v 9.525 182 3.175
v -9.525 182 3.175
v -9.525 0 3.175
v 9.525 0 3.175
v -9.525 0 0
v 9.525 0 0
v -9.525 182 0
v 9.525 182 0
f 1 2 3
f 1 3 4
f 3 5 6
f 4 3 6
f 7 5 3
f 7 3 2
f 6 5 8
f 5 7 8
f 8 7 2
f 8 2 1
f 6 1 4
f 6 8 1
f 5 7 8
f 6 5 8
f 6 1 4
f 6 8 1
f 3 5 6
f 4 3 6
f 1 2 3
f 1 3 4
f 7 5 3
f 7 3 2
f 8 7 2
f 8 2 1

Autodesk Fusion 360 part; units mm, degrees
ref_plane "WorkPlane12" through (0, -1, 0) normal (0, 1, 0) x (0, 0, 1)
sketch "MyStock" plane through (0, 0, 0) normal (0, 0, 1) x (1, 0, 0)
  line L0 (-9.525, 182) -> (9.525, 182)
  line L1 (9.525, 182) -> (9.525, 0)
  line L2 (-9.525, 0) -> (-9.525, 182)
  line L3 (-9.525, 0) -> (9.525, 0)
  dimension "d2016" = 9.525
  dimension "d2017" = 9.525
  dimension "d2102" = 182
extrude "Extrude21" add sketch "MyStock" along normal blind 3.175 makes body 1
sketch "Box Big part" plane through (0, 0, 0) normal (0, 0, 1) x (1, 0, 0)
  line L0 (-224.905, 0) -> (-240, 0)
  line L1 (0, 16.095) -> (0, 0)
  line L2 (-240, 0) -> (-224.905, 0)
  line L3 (-224.905, 0) -> (-224.905, 1.5613)
  line L4 (-223.7758, 3.175) -> (-216.2242, 3.175)
  line L5 (-215.095, 1.5613) -> (-215.095, 0)
  line L6 (-240, 16.095) -> (-238.4387, 16.095)
  line L7 (-236.825, 17.2242) -> (-236.825, 24.7758)
  line L8 (-238.4387, 25.905) -> (-240, 25.905)
  line L9 (-215.095, 0) -> (-204.905, 0)
  line L10 (1.75, 0) -> (22.5, 0)
  arc A0 (-215.095, 1.5613) -> (-216.2242, 3.175) centre (-215.5171, 2.4679) ccw
  arc A1 (-223.7758, 3.175) -> (-224.905, 1.5613) centre (-224.4829, 2.4679) ccw
  line L11 (-240, 0) -> (-240, 16.095)
  line L12 (-240, 25.905) -> (-240, 36.095)
  arc A2 (-238.4387, 16.095) -> (-236.825, 17.2242) centre (-237.5321, 16.5171) ccw
  arc A3 (-236.825, 24.7758) -> (-238.4387, 25.905) centre (-237.5321, 25.4829) ccw
  line L13 (-302, 91) -> (0, 91) construction
  line L14 (-120, -20) -> (-120, 200) construction
  arc A4 (-1.5613, 25.905) -> (-3.175, 24.7758) centre (-2.4679, 25.4829) ccw
  arc A5 (-3.175, 17.2242) -> (-1.5613, 16.095) centre (-2.4679, 16.5171) ccw
  line L15 (-3.175, 17.2242) -> (-3.175, 24.7758)
  line L16 (-1.5613, 25.905) -> (0, 25.905)
  line L17 (0, 25.905) -> (0, 36.095)
  line L18 (0, 16.095) -> (-1.5613, 16.095)
  line L19 (0, 16.095) -> (0, 0)
  line L20 (-215.095, 180.4387) -> (-215.095, 182)
  line L21 (-224.905, 182) -> (-224.905, 180.4387)
  line L22 (-215.095, 182) -> (-204.905, 182)
  arc A6 (-216.2242, 178.825) -> (-215.095, 180.4387) centre (-215.5171, 179.5321) ccw
  line L23 (-224.905, 182) -> (-240, 182)
  arc A7 (-224.905, 180.4387) -> (-223.7758, 178.825) centre (-224.4829, 179.5321) ccw
  line L24 (-223.7758, 178.825) -> (-216.2242, 178.825)
  line L25 (-240, 182) -> (-224.905, 182)
  arc A8 (-195.095, 1.5613) -> (-196.2242, 3.175) centre (-195.5171, 2.4679) ccw
  line L26 (-195.095, 1.5613) -> (-195.095, 0)
  arc A9 (-203.7758, 3.175) -> (-204.905, 1.5613) centre (-204.4829, 2.4679) ccw
  line L27 (-195.095, 0) -> (-184.905, 0)
  line L28 (-203.7758, 3.175) -> (-196.2242, 3.175)
  line L29 (-204.905, 0) -> (-204.905, 1.5613)
  arc A10 (-175.095, 1.5613) -> (-176.2242, 3.175) centre (-175.5171, 2.4679) ccw
  line L30 (-175.095, 1.5613) -> (-175.095, 0)
  arc A11 (-183.7758, 3.175) -> (-184.905, 1.5613) centre (-184.4829, 2.4679) ccw
  line L31 (-175.095, 0) -> (-164.905, 0)
  line L32 (-183.7758, 3.175) -> (-176.2242, 3.175)
  line L33 (-184.905, 0) -> (-184.905, 1.5613)
  arc A12 (-155.095, 1.5613) -> (-156.2242, 3.175) centre (-155.5171, 2.4679) ccw
  line L34 (-155.095, 1.5613) -> (-155.095, 0)
  arc A13 (-163.7758, 3.175) -> (-164.905, 1.5613) centre (-164.4829, 2.4679) ccw
  line L35 (-155.095, 0) -> (-144.905, 0)
  line L36 (-163.7758, 3.175) -> (-156.2242, 3.175)
  line L37 (-164.905, 0) -> (-164.905, 1.5613)
  arc A14 (-135.095, 1.5613) -> (-136.2242, 3.175) centre (-135.5171, 2.4679) ccw
  line L38 (-135.095, 1.5613) -> (-135.095, 0)
  arc A15 (-143.7758, 3.175) -> (-144.905, 1.5613) centre (-144.4829, 2.4679) ccw
  line L39 (-135.095, 0) -> (-124.905, 0)
  line L40 (-143.7758, 3.175) -> (-136.2242, 3.175)
  line L41 (-144.905, 0) -> (-144.905, 1.5613)
  arc A16 (-115.095, 1.5613) -> (-116.2242, 3.175) centre (-115.5171, 2.4679) ccw
  line L42 (-115.095, 1.5613) -> (-115.095, 0)
  arc A17 (-123.7758, 3.175) -> (-124.905, 1.5613) centre (-124.4829, 2.4679) ccw
  line L43 (-115.095, 0) -> (-104.905, 0)
  line L44 (-123.7758, 3.175) -> (-116.2242, 3.175)
  line L45 (-124.905, 0) -> (-124.905, 1.5613)
  arc A18 (-95.095, 1.5613) -> (-96.2242, 3.175) centre (-95.5171, 2.4679) ccw
  line L46 (-95.095, 1.5613) -> (-95.095, 0)
  arc A19 (-103.7758, 3.175) -> (-104.905, 1.5613) centre (-104.4829, 2.4679) ccw
  line L47 (-95.095, 0) -> (-84.905, 0)
  line L48 (-103.7758, 3.175) -> (-96.2242, 3.175)
  line L49 (-104.905, 0) -> (-104.905, 1.5613)
  line L50 (0, 0) -> (-4.905, 0)
  line L51 (-238.4387, 45.905) -> (-240, 45.905)
  line L52 (-240, 36.095) -> (-238.4387, 36.095)
  arc A20 (-238.4387, 36.095) -> (-236.825, 37.2242) centre (-237.5321, 36.5171) ccw
  line L53 (-240, 45.905) -> (-240, 56.095)
  arc A21 (-236.825, 44.7758) -> (-238.4387, 45.905) centre (-237.5321, 45.4829) ccw
  line L54 (-236.825, 37.2242) -> (-236.825, 44.7758)
  line L55 (-238.4387, 65.905) -> (-240, 65.905)
  line L56 (-240, 56.095) -> (-238.4387, 56.095)
  arc A22 (-238.4387, 56.095) -> (-236.825, 57.2242) centre (-237.5321, 56.5171) ccw
  line L57 (-240, 65.905) -> (-240, 76.095)
  arc A23 (-236.825, 64.7758) -> (-238.4387, 65.905) centre (-237.5321, 65.4829) ccw
  line L58 (-236.825, 57.2242) -> (-236.825, 64.7758)
  line L59 (-238.4387, 85.905) -> (-240, 85.905)
  line L60 (-240, 76.095) -> (-238.4387, 76.095)
  arc A24 (-238.4387, 76.095) -> (-236.825, 77.2242) centre (-237.5321, 76.5171) ccw
  line L61 (-240, 85.905) -> (-240, 96.095)
  arc A25 (-236.825, 84.7758) -> (-238.4387, 85.905) centre (-237.5321, 85.4829) ccw
  line L62 (-236.825, 77.2242) -> (-236.825, 84.7758)
  line L63 (-238.4387, 105.905) -> (-240, 105.905)
  line L64 (-240, 96.095) -> (-238.4387, 96.095)
  arc A26 (-238.4387, 96.095) -> (-236.825, 97.2242) centre (-237.5321, 96.5171) ccw
  line L65 (-240, 105.905) -> (-240, 116.095)
  arc A27 (-236.825, 104.7758) -> (-238.4387, 105.905) centre (-237.5321, 105.4829) ccw
  line L66 (-236.825, 97.2242) -> (-236.825, 104.7758)
  arc A28 (-196.2242, 178.825) -> (-195.095, 180.4387) centre (-195.5171, 179.5321) ccw
  line L67 (-195.095, 180.4387) -> (-195.095, 182)
  arc A29 (-204.905, 180.4387) -> (-203.7758, 178.825) centre (-204.4829, 179.5321) ccw
  line L68 (-203.7758, 178.825) -> (-196.2242, 178.825)
  line L69 (-204.905, 182) -> (-204.905, 180.4387)
  line L70 (-195.095, 182) -> (-184.905, 182)
  arc A30 (-176.2242, 178.825) -> (-175.095, 180.4387) centre (-175.5171, 179.5321) ccw
  line L71 (-175.095, 180.4387) -> (-175.095, 182)
  arc A31 (-184.905, 180.4387) -> (-183.7758, 178.825) centre (-184.4829, 179.5321) ccw
  line L72 (-183.7758, 178.825) -> (-176.2242, 178.825)
  line L73 (-184.905, 182) -> (-184.905, 180.4387)
  line L74 (-175.095, 182) -> (-164.905, 182)
  arc A32 (-156.2242, 178.825) -> (-155.095, 180.4387) centre (-155.5171, 179.5321) ccw
  line L75 (-155.095, 180.4387) -> (-155.095, 182)
  arc A33 (-164.905, 180.4387) -> (-163.7758, 178.825) centre (-164.4829, 179.5321) ccw
  line L76 (-163.7758, 178.825) -> (-156.2242, 178.825)
  line L77 (-164.905, 182) -> (-164.905, 180.4387)
  line L78 (-155.095, 182) -> (-144.905, 182)
  arc A34 (-136.2242, 178.825) -> (-135.095, 180.4387) centre (-135.5171, 179.5321) ccw
  line L79 (-135.095, 180.4387) -> (-135.095, 182)
  arc A35 (-144.905, 180.4387) -> (-143.7758, 178.825) centre (-144.4829, 179.5321) ccw
  line L80 (-143.7758, 178.825) -> (-136.2242, 178.825)
  line L81 (-144.905, 182) -> (-144.905, 180.4387)
  line L82 (-135.095, 182) -> (-124.905, 182)
  arc A36 (-116.2242, 178.825) -> (-115.095, 180.4387) centre (-115.5171, 179.5321) ccw
  line L83 (-115.095, 180.4387) -> (-115.095, 182)
  arc A37 (-124.905, 180.4387) -> (-123.7758, 178.825) centre (-124.4829, 179.5321) ccw
  line L84 (-123.7758, 178.825) -> (-116.2242, 178.825)
  line L85 (-124.905, 182) -> (-124.905, 180.4387)
  line L86 (-115.095, 182) -> (-104.905, 182)
  arc A38 (-96.2242, 178.825) -> (-95.095, 180.4387) centre (-95.5171, 179.5321) ccw
  line L87 (-95.095, 180.4387) -> (-95.095, 182)
  arc A39 (-104.905, 180.4387) -> (-103.7758, 178.825) centre (-104.4829, 179.5321) ccw
  line L88 (-103.7758, 178.825) -> (-96.2242, 178.825)
  line L89 (-104.905, 182) -> (-104.905, 180.4387)
  line L90 (-95.095, 182) -> (-84.905, 182)
  line L91 (0, 182) -> (-4.905, 182)
  line L92 (-3.175, 37.2242) -> (-3.175, 44.7758)
  line L93 (-1.5613, 45.905) -> (0, 45.905)
  line L94 (0, 45.905) -> (0, 56.095)
  arc A40 (-1.5613, 45.905) -> (-3.175, 44.7758) centre (-2.4679, 45.4829) ccw
  line L95 (0, 36.095) -> (-1.5613, 36.095)
  line L96 (-3.175, 57.2242) -> (-3.175, 64.7758)
  line L97 (-1.5613, 65.905) -> (0, 65.905)
  line L98 (0, 65.905) -> (0, 76.095)
  arc A41 (-1.5613, 65.905) -> (-3.175, 64.7758) centre (-2.4679, 65.4829) ccw
  line L99 (0, 56.095) -> (-1.5613, 56.095)
  line L100 (-3.175, 77.2242) -> (-3.175, 84.7758)
  line L101 (-1.5613, 85.905) -> (0, 85.905)
  line L102 (0, 85.905) -> (0, 96.095)
  arc A42 (-1.5613, 85.905) -> (-3.175, 84.7758) centre (-2.4679, 85.4829) ccw
  line L103 (0, 76.095) -> (-1.5613, 76.095)
  line L104 (-3.175, 97.2242) -> (-3.175, 104.7758)
  line L105 (-1.5613, 105.905) -> (0, 105.905)
  line L106 (0, 105.905) -> (0, 116.095)
  arc A43 (-1.5613, 105.905) -> (-3.175, 104.7758) centre (-2.4679, 105.4829) ccw
  line L107 (0, 96.095) -> (-1.5613, 96.095)
  arc A44 (-3.175, 37.2242) -> (-1.5613, 36.095) centre (-2.4679, 36.5171) ccw
  arc A45 (-3.175, 57.2242) -> (-1.5613, 56.095) centre (-2.4679, 56.5171) ccw
  arc A46 (-3.175, 77.2242) -> (-1.5613, 76.095) centre (-2.4679, 76.5171) ccw
  arc A47 (-3.175, 97.2242) -> (-1.5613, 96.095) centre (-2.4679, 96.5171) ccw
  line L108 (0, 182) -> (0, 176.095)
  line L109 (-240, 182) -> (-240, 176.095)
  arc A48 (-75.095, 1.5613) -> (-76.2242, 3.175) centre (-75.5171, 2.4679) ccw
  line L110 (-75.095, 1.5613) -> (-75.095, 0)
  arc A49 (-83.7758, 3.175) -> (-84.905, 1.5613) centre (-84.4829, 2.4679) ccw
  line L111 (-75.095, 0) -> (-64.905, 0)
  line L112 (-83.7758, 3.175) -> (-76.2242, 3.175)
  line L113 (-84.905, 0) -> (-84.905, 1.5613)
  arc A50 (-55.095, 1.5613) -> (-56.2242, 3.175) centre (-55.5171, 2.4679) ccw
  line L114 (-55.095, 1.5613) -> (-55.095, 0)
  arc A51 (-63.7758, 3.175) -> (-64.905, 1.5613) centre (-64.4829, 2.4679) ccw
  line L115 (-55.095, 0) -> (-44.905, 0)
  line L116 (-63.7758, 3.175) -> (-56.2242, 3.175)
  line L117 (-64.905, 0) -> (-64.905, 1.5613)
  arc A52 (-35.095, 1.5613) -> (-36.2242, 3.175) centre (-35.5171, 2.4679) ccw
  line L118 (-35.095, 1.5613) -> (-35.095, 0)
  arc A53 (-43.7758, 3.175) -> (-44.905, 1.5613) centre (-44.4829, 2.4679) ccw
  line L119 (-35.095, 0) -> (-24.905, 0)
  line L120 (-43.7758, 3.175) -> (-36.2242, 3.175)
  line L121 (-44.905, 0) -> (-44.905, 1.5613)
  arc A54 (-15.095, 1.5613) -> (-16.2242, 3.175) centre (-15.5171, 2.4679) ccw
  line L122 (-15.095, 1.5613) -> (-15.095, 0)
  arc A55 (-23.7758, 3.175) -> (-24.905, 1.5613) centre (-24.4829, 2.4679) ccw
  line L123 (-15.095, 0) -> (-4.905, 0)
  line L124 (-23.7758, 3.175) -> (-16.2242, 3.175)
  line L125 (-24.905, 0) -> (-24.905, 1.5613)
  line L126 (-238.4387, 125.905) -> (-240, 125.905)
  line L127 (-240, 116.095) -> (-238.4387, 116.095)
  arc A56 (-238.4387, 116.095) -> (-236.825, 117.2242) centre (-237.5321, 116.5171) ccw
  line L128 (-240, 125.905) -> (-240, 136.095)
  arc A57 (-236.825, 124.7758) -> (-238.4387, 125.905) centre (-237.5321, 125.4829) ccw
  line L129 (-236.825, 117.2242) -> (-236.825, 124.7758)
  line L130 (-238.4387, 145.905) -> (-240, 145.905)
  line L131 (-240, 136.095) -> (-238.4387, 136.095)
  arc A58 (-238.4387, 136.095) -> (-236.825, 137.2242) centre (-237.5321, 136.5171) ccw
  line L132 (-240, 145.905) -> (-240, 156.095)
  arc A59 (-236.825, 144.7758) -> (-238.4387, 145.905) centre (-237.5321, 145.4829) ccw
  line L133 (-236.825, 137.2242) -> (-236.825, 144.7758)
  line L134 (-238.4387, 165.905) -> (-240, 165.905)
  line L135 (-240, 156.095) -> (-238.4387, 156.095)
  arc A60 (-238.4387, 156.095) -> (-236.825, 157.2242) centre (-237.5321, 156.5171) ccw
  line L136 (-240, 165.905) -> (-240, 176.095)
  arc A61 (-236.825, 164.7758) -> (-238.4387, 165.905) centre (-237.5321, 165.4829) ccw
  line L137 (-236.825, 157.2242) -> (-236.825, 164.7758)
  arc A62 (-76.2242, 178.825) -> (-75.095, 180.4387) centre (-75.5171, 179.5321) ccw
  line L138 (-75.095, 180.4387) -> (-75.095, 182)
  arc A63 (-84.905, 180.4387) -> (-83.7758, 178.825) centre (-84.4829, 179.5321) ccw
  line L139 (-83.7758, 178.825) -> (-76.2242, 178.825)
  line L140 (-84.905, 182) -> (-84.905, 180.4387)
  line L141 (-75.095, 182) -> (-64.905, 182)
  arc A64 (-56.2242, 178.825) -> (-55.095, 180.4387) centre (-55.5171, 179.5321) ccw
  line L142 (-55.095, 180.4387) -> (-55.095, 182)
  arc A65 (-64.905, 180.4387) -> (-63.7758, 178.825) centre (-64.4829, 179.5321) ccw
  line L143 (-63.7758, 178.825) -> (-56.2242, 178.825)
  line L144 (-64.905, 182) -> (-64.905, 180.4387)
  line L145 (-55.095, 182) -> (-44.905, 182)
  arc A66 (-36.2242, 178.825) -> (-35.095, 180.4387) centre (-35.5171, 179.5321) ccw
  line L146 (-35.095, 180.4387) -> (-35.095, 182)
  arc A67 (-44.905, 180.4387) -> (-43.7758, 178.825) centre (-44.4829, 179.5321) ccw
  line L147 (-43.7758, 178.825) -> (-36.2242, 178.825)
  line L148 (-44.905, 182) -> (-44.905, 180.4387)
  line L149 (-35.095, 182) -> (-24.905, 182)
  arc A68 (-16.2242, 178.825) -> (-15.095, 180.4387) centre (-15.5171, 179.5321) ccw
  line L150 (-15.095, 180.4387) -> (-15.095, 182)
  arc A69 (-24.905, 180.4387) -> (-23.7758, 178.825) centre (-24.4829, 179.5321) ccw
  line L151 (-23.7758, 178.825) -> (-16.2242, 178.825)
  line L152 (-24.905, 182) -> (-24.905, 180.4387)
  line L153 (-15.095, 182) -> (-4.905, 182)
  line L154 (-3.175, 117.2242) -> (-3.175, 124.7758)
  line L155 (-1.5613, 125.905) -> (0, 125.905)
  line L156 (0, 125.905) -> (0, 136.095)
  arc A70 (-1.5613, 125.905) -> (-3.175, 124.7758) centre (-2.4679, 125.4829) ccw
  line L157 (0, 116.095) -> (-1.5613, 116.095)
  arc A71 (-3.175, 117.2242) -> (-1.5613, 116.095) centre (-2.4679, 116.5171) ccw
  line L158 (-3.175, 137.2242) -> (-3.175, 144.7758)
  line L159 (-1.5613, 145.905) -> (0, 145.905)
  line L160 (0, 145.905) -> (0, 156.095)
  arc A72 (-1.5613, 145.905) -> (-3.175, 144.7758) centre (-2.4679, 145.4829) ccw
  line L161 (0, 136.095) -> (-1.5613, 136.095)
  arc A73 (-3.175, 137.2242) -> (-1.5613, 136.095) centre (-2.4679, 136.5171) ccw
  line L162 (-3.175, 157.2242) -> (-3.175, 164.7758)
  line L163 (-1.5613, 165.905) -> (0, 165.905)
  line L164 (0, 165.905) -> (0, 176.095)
  arc A74 (-1.5613, 165.905) -> (-3.175, 164.7758) centre (-2.4679, 165.4829) ccw
  line L165 (0, 156.095) -> (-1.5613, 156.095)
  arc A75 (-3.175, 157.2242) -> (-1.5613, 156.095) centre (-2.4679, 156.5171) ccw
  dimension "d34" = 2
  dimension "d36" = 0.4221
  dimension "d37" = 0.7071
  dimension "d38" = 0.4221
  dimension "d48" = 2
  dimension "d49" = 0.4221
  dimension "d50" = 16.095
  dimension "d52" = 0.4221
  dimension "d54" = 0.7071
  dimension "d55" = 9.81
  dimension "d189" = 15.095
  dimension "d473" = 240
  dimension "d2062" = 10.19
  dimension "d2063" = 9.81
  dimension "d2064" = 3.175
  dimension "d2068" = 3.175
  dimension "d2069" = 10.19
  dimension "d2071" = 120
  dimension "d2074" = 20
  dimension "d2075" = 0
  dimension "d2076" = 4.905
  dimension "d2080" = 0
  dimension "d2081" = 20
  dimension "d2084" = 20
  dimension "d2085" = 0
  dimension "d2087" = 4.905
  dimension "d2088" = 182
  dimension "d2091" = 0
  dimension "d2092" = 20
  dimension "d2095" = 5.905
  dimension "d2097" = 5.905
  dimension "d2098" = 182
  dimension "d2103" = 91
sketch "Box Medium part" plane through (0, 0, 0) normal (0, 0, 1) x (1, 0, 0)
  line L0 (28.2242, 3.175) -> (35.7758, 3.175)
  line L1 (240.4387, 14.905) -> (242, 14.905)
  line L2 (238.825, 3.175) -> (238.825, 13.7758)
  line L3 (242, 25.095) -> (240.4387, 25.095)
  line L4 (2, 60) -> (242, 60) construction
  line L5 (27.095, 0) -> (27.095, 1.5613)
  line L6 (240.4387, 34.905) -> (242, 34.905)
  line L7 (5.175, 3.175) -> (15.7758, 3.175)
  line L8 (36.905, 1.5613) -> (36.905, 0)
  line L9 (242, 60) -> (242, 0) construction
  line L10 (238.825, 26.2242) -> (238.825, 33.7758)
  line L11 (16.905, 1.5613) -> (16.905, 0)
  line L12 (2, -28) -> (2, 0) construction
  arc A0 (16.905, 1.5613) -> (15.7758, 3.175) centre (16.4829, 2.4679) ccw
  arc A1 (28.2242, 3.175) -> (27.095, 1.5613) centre (27.5171, 2.4679) ccw
  arc A2 (36.905, 1.5613) -> (35.7758, 3.175) centre (36.4829, 2.4679) ccw
  arc A3 (240.4387, 14.905) -> (238.825, 13.7758) centre (239.5321, 14.4829) ccw
  line L13 (16.905, 0) -> (27.095, 0)
  line L14 (-22, 30) -> (297, 30) construction
  line L15 (122, -24.8824) -> (122, 81) construction
  arc A4 (238.825, 26.2242) -> (240.4387, 25.095) centre (239.5321, 25.5171) ccw
  arc A5 (240.4387, 34.905) -> (238.825, 33.7758) centre (239.5321, 34.4829) ccw
  line L16 (36.905, 0) -> (47.095, 0)
  line L17 (242, 34.905) -> (242, 45.095)
  line L18 (2, -28) -> (2, 30) construction
  line L19 (2, 60) -> (2, 30) construction
  line L20 (0, 0) -> (47.095, 0) construction
  line L21 (122, 0) -> (242, 0) construction
  line L22 (36.905, 58.4387) -> (36.905, 60)
  arc A6 (35.7758, 56.825) -> (36.905, 58.4387) centre (36.4829, 57.5321) ccw
  line L23 (36.905, 60) -> (47.095, 60)
  arc A7 (15.7758, 56.825) -> (16.905, 58.4387) centre (16.4829, 57.5321) ccw
  line L24 (27.095, 60) -> (27.095, 58.4387)
  line L25 (16.905, 58.4387) -> (16.905, 60)
  arc A8 (27.095, 58.4387) -> (28.2242, 56.825) centre (27.5171, 57.5321) ccw
  line L26 (16.905, 60) -> (27.095, 60)
  line L27 (28.2242, 56.825) -> (35.7758, 56.825)
  line L28 (0, 60) -> (47.095, 60) construction
  line L29 (5.175, 56.825) -> (15.7758, 56.825)
  line L30 (3.5613, 14.905) -> (2, 14.905)
  arc A9 (5.175, 33.7758) -> (3.5613, 34.905) centre (4.4679, 34.4829) ccw
  line L31 (5.175, 3.175) -> (5.175, 13.7758)
  line L32 (3.5613, 34.905) -> (2, 34.905)
  line L33 (5.175, 26.2242) -> (5.175, 33.7758)
  line L34 (2, 25.095) -> (3.5613, 25.095)
  arc A10 (5.175, 13.7758) -> (3.5613, 14.905) centre (4.4679, 14.4829) ccw
  arc A11 (3.5613, 25.095) -> (5.175, 26.2242) centre (4.4679, 25.5171) ccw
  line L35 (2, 34.905) -> (2, 45.095)
  arc A12 (56.905, 1.5613) -> (55.7758, 3.175) centre (56.4829, 2.4679) ccw
  line L36 (48.2242, 3.175) -> (55.7758, 3.175)
  arc A13 (48.2242, 3.175) -> (47.095, 1.5613) centre (47.5171, 2.4679) ccw
  line L37 (56.905, 0) -> (67.095, 0)
  line L38 (56.905, 1.5613) -> (56.905, 0)
  line L39 (47.095, 0) -> (47.095, 1.5613)
  arc A14 (76.905, 1.5613) -> (75.7758, 3.175) centre (76.4829, 2.4679) ccw
  line L40 (68.2242, 3.175) -> (75.7758, 3.175)
  arc A15 (68.2242, 3.175) -> (67.095, 1.5613) centre (67.5171, 2.4679) ccw
  line L41 (76.905, 0) -> (87.095, 0)
  line L42 (76.905, 1.5613) -> (76.905, 0)
  line L43 (67.095, 0) -> (67.095, 1.5613)
  arc A16 (96.905, 1.5613) -> (95.7758, 3.175) centre (96.4829, 2.4679) ccw
  line L44 (88.2242, 3.175) -> (95.7758, 3.175)
  arc A17 (88.2242, 3.175) -> (87.095, 1.5613) centre (87.5171, 2.4679) ccw
  line L45 (96.905, 0) -> (107.095, 0)
  line L46 (96.905, 1.5613) -> (96.905, 0)
  line L47 (87.095, 0) -> (87.095, 1.5613)
  arc A18 (116.905, 1.5613) -> (115.7758, 3.175) centre (116.4829, 2.4679) ccw
  line L48 (108.2242, 3.175) -> (115.7758, 3.175)
  arc A19 (108.2242, 3.175) -> (107.095, 1.5613) centre (107.5171, 2.4679) ccw
  line L49 (116.905, 0) -> (127.095, 0)
  line L50 (116.905, 1.5613) -> (116.905, 0)
  line L51 (107.095, 0) -> (107.095, 1.5613)
  arc A20 (136.905, 1.5613) -> (135.7758, 3.175) centre (136.4829, 2.4679) ccw
  line L52 (128.2242, 3.175) -> (135.7758, 3.175)
  arc A21 (128.2242, 3.175) -> (127.095, 1.5613) centre (127.5171, 2.4679) ccw
  line L53 (136.905, 0) -> (147.095, 0)
  line L54 (136.905, 1.5613) -> (136.905, 0)
  line L55 (127.095, 0) -> (127.095, 1.5613)
  line L56 (47.095, 60) -> (47.095, 58.4387)
  line L57 (48.2242, 56.825) -> (55.7758, 56.825)
  arc A22 (55.7758, 56.825) -> (56.905, 58.4387) centre (56.4829, 57.5321) ccw
  arc A23 (47.095, 58.4387) -> (48.2242, 56.825) centre (47.5171, 57.5321) ccw
  line L58 (56.905, 60) -> (67.095, 60)
  line L59 (56.905, 58.4387) -> (56.905, 60)
  line L60 (67.095, 60) -> (67.095, 58.4387)
  line L61 (68.2242, 56.825) -> (75.7758, 56.825)
  arc A24 (75.7758, 56.825) -> (76.905, 58.4387) centre (76.4829, 57.5321) ccw
  arc A25 (67.095, 58.4387) -> (68.2242, 56.825) centre (67.5171, 57.5321) ccw
  line L62 (76.905, 60) -> (87.095, 60)
  line L63 (76.905, 58.4387) -> (76.905, 60)
  line L64 (87.095, 60) -> (87.095, 58.4387)
  line L65 (88.2242, 56.825) -> (95.7758, 56.825)
  arc A26 (95.7758, 56.825) -> (96.905, 58.4387) centre (96.4829, 57.5321) ccw
  arc A27 (87.095, 58.4387) -> (88.2242, 56.825) centre (87.5171, 57.5321) ccw
  line L66 (96.905, 60) -> (107.095, 60)
  line L67 (96.905, 58.4387) -> (96.905, 60)
  line L68 (107.095, 60) -> (107.095, 58.4387)
  line L69 (108.2242, 56.825) -> (115.7758, 56.825)
  arc A28 (115.7758, 56.825) -> (116.905, 58.4387) centre (116.4829, 57.5321) ccw
  arc A29 (107.095, 58.4387) -> (108.2242, 56.825) centre (107.5171, 57.5321) ccw
  line L70 (116.905, 60) -> (127.095, 60)
  line L71 (116.905, 58.4387) -> (116.905, 60)
  line L72 (127.095, 60) -> (127.095, 58.4387)
  line L73 (128.2242, 56.825) -> (135.7758, 56.825)
  arc A30 (135.7758, 56.825) -> (136.905, 58.4387) centre (136.4829, 57.5321) ccw
  arc A31 (127.095, 58.4387) -> (128.2242, 56.825) centre (127.5171, 57.5321) ccw
  line L74 (136.905, 60) -> (147.095, 60)
  line L75 (136.905, 58.4387) -> (136.905, 60)
  line L76 (227.095, 1.5613) -> (227.095, 0)
  arc A32 (228.2242, 3.175) -> (227.095, 1.5613) centre (227.5171, 2.4679) ccw
  line L77 (238.825, 3.175) -> (228.2242, 3.175)
  line L78 (242, 88) -> (242, 60) construction
  line L79 (227.095, 58.4387) -> (227.095, 60)
  line L80 (242, 60) -> (242, 30) construction
  arc A33 (227.095, 58.4387) -> (228.2242, 56.825) centre (227.5171, 57.5321) ccw
  line L81 (238.825, 56.825) -> (228.2242, 56.825)
  line L82 (2, 14.905) -> (2, 25.095)
  arc A34 (3.5613, 45.095) -> (5.175, 46.2242) centre (4.4679, 45.5171) ccw
  line L83 (3.5613, 45.095) -> (2, 45.095)
  line L84 (5.175, 56.825) -> (5.175, 46.2242)
  arc A35 (238.825, 46.2242) -> (240.4387, 45.095) centre (239.5321, 45.5171) ccw
  line L85 (240.4387, 45.095) -> (242, 45.095)
  line L86 (238.825, 56.825) -> (238.825, 46.2242)
  line L87 (242, 25.095) -> (242, 14.905)
  arc A36 (156.905, 1.5613) -> (155.7758, 3.175) centre (156.4829, 2.4679) ccw
  line L88 (148.2242, 3.175) -> (155.7758, 3.175)
  arc A37 (148.2242, 3.175) -> (147.095, 1.5613) centre (147.5171, 2.4679) ccw
  line L89 (156.905, 0) -> (167.095, 0)
  line L90 (156.905, 1.5613) -> (156.905, 0)
  line L91 (147.095, 0) -> (147.095, 1.5613)
  arc A38 (176.905, 1.5613) -> (175.7758, 3.175) centre (176.4829, 2.4679) ccw
  line L92 (168.2242, 3.175) -> (175.7758, 3.175)
  arc A39 (168.2242, 3.175) -> (167.095, 1.5613) centre (167.5171, 2.4679) ccw
  line L93 (176.905, 0) -> (187.095, 0)
  line L94 (176.905, 1.5613) -> (176.905, 0)
  line L95 (167.095, 0) -> (167.095, 1.5613)
  arc A40 (196.905, 1.5613) -> (195.7758, 3.175) centre (196.4829, 2.4679) ccw
  line L96 (188.2242, 3.175) -> (195.7758, 3.175)
  arc A41 (188.2242, 3.175) -> (187.095, 1.5613) centre (187.5171, 2.4679) ccw
  line L97 (196.905, 0) -> (207.095, 0)
  line L98 (196.905, 1.5613) -> (196.905, 0)
  line L99 (187.095, 0) -> (187.095, 1.5613)
  arc A42 (216.905, 1.5613) -> (215.7758, 3.175) centre (216.4829, 2.4679) ccw
  line L100 (208.2242, 3.175) -> (215.7758, 3.175)
  arc A43 (208.2242, 3.175) -> (207.095, 1.5613) centre (207.5171, 2.4679) ccw
  line L101 (216.905, 0) -> (227.095, 0)
  line L102 (216.905, 1.5613) -> (216.905, 0)
  line L103 (207.095, 0) -> (207.095, 1.5613)
  line L104 (147.095, 60) -> (147.095, 58.4387)
  line L105 (148.2242, 56.825) -> (155.7758, 56.825)
  arc A44 (155.7758, 56.825) -> (156.905, 58.4387) centre (156.4829, 57.5321) ccw
  arc A45 (147.095, 58.4387) -> (148.2242, 56.825) centre (147.5171, 57.5321) ccw
  line L106 (156.905, 60) -> (167.095, 60)
  line L107 (156.905, 58.4387) -> (156.905, 60)
  line L108 (167.095, 60) -> (167.095, 58.4387)
  line L109 (168.2242, 56.825) -> (175.7758, 56.825)
  arc A46 (175.7758, 56.825) -> (176.905, 58.4387) centre (176.4829, 57.5321) ccw
  arc A47 (167.095, 58.4387) -> (168.2242, 56.825) centre (167.5171, 57.5321) ccw
  line L110 (176.905, 60) -> (187.095, 60)
  line L111 (176.905, 58.4387) -> (176.905, 60)
  line L112 (187.095, 60) -> (187.095, 58.4387)
  line L113 (188.2242, 56.825) -> (195.7758, 56.825)
  arc A48 (195.7758, 56.825) -> (196.905, 58.4387) centre (196.4829, 57.5321) ccw
  arc A49 (187.095, 58.4387) -> (188.2242, 56.825) centre (187.5171, 57.5321) ccw
  line L114 (196.905, 60) -> (207.095, 60)
  line L115 (196.905, 58.4387) -> (196.905, 60)
  line L116 (207.095, 60) -> (207.095, 58.4387)
  line L117 (208.2242, 56.825) -> (215.7758, 56.825)
  arc A50 (215.7758, 56.825) -> (216.905, 58.4387) centre (216.4829, 57.5321) ccw
  arc A51 (207.095, 58.4387) -> (208.2242, 56.825) centre (207.5171, 57.5321) ccw
  line L118 (216.905, 60) -> (227.095, 60)
  line L119 (216.905, 58.4387) -> (216.905, 60)
  point P0 (0, 60)
  point P1 (0, 60)
  point P2 (0, 60)
  point P3 (0, 60)
  point P4 (0, 60)
  point P5 (244, 60)
  point P6 (244, 60)
  point P7 (244, 60)
  point P8 (244, 60)
  point P9 (244, 60)
  point P10 (244, 60)
  dimension "d1829" = 60
  dimension "d1833" = 240
  dimension "d1834" = 2
  dimension "d1835" = 0.4221
  dimension "d1836" = 0.7071
  dimension "d1837" = 0.4221
  dimension "d1842" = 2
  dimension "d1843" = 0.7071
  dimension "d1844" = 0.4221
  dimension "d1845" = 2
  dimension "d1846" = 0.4221
  dimension "d1848" = 2
  dimension "d1849" = 0.4221
  dimension "d1850" = 10.19
  dimension "d1862" = 0.4221
  dimension "d2106" = 14.905
  dimension "d2107" = 2
  dimension "d2109" = 9.81
  dimension "d2110" = 10.19
  dimension "d2111" = 30
  dimension "d2112" = 122
  dimension "d2113" = 58
  dimension "d2114" = 242
  dimension "d2115" = 3.175
  dimension "d2116" = 3.175
  dimension "d2117" = 9.81
  dimension "d2118" = 10.19
  dimension "d2119" = 10.19
  dimension "d2122" = 11.73
  dimension "d2123" = 3.175
  dimension "d2126" = 20
  dimension "d2127" = 0
  dimension "d2130" = 20
  dimension "d2131" = 0
  dimension "d2134" = 0
  dimension "d2135" = 20
  dimension "d2138" = 0
  dimension "d2139" = 20
sketch "Box Small Part" plane through (0, 0, 0) normal (0, 0, 1) x (1, 0, 0)
  line L0 (-286.905, 0) -> (-286.905, 1.5613)
  line L1 (-245.175, 0) -> (-245.175, 14.7758)
  line L2 (-243.5613, 35.905) -> (-242, 35.905)
  line L3 (-285.7758, 3.175) -> (-278.2242, 3.175)
  line L4 (-277.095, 1.5613) -> (-277.095, 0)
  line L5 (-243.5613, 15.905) -> (-242, 15.905)
  line L6 (-242, 26.095) -> (-242, 15.905)
  arc A0 (-243.5613, 15.905) -> (-245.175, 14.7758) centre (-244.4679, 15.4829) ccw
  arc A1 (-245.175, 27.2242) -> (-243.5613, 26.095) centre (-244.4679, 26.5171) ccw
  line L7 (-242, 26.095) -> (-243.5613, 26.095)
  line L8 (-245.175, 27.2242) -> (-245.175, 34.7758)
  arc A2 (-243.5613, 35.905) -> (-245.175, 34.7758) centre (-244.4679, 35.4829) ccw
  line L9 (-266.905, 0) -> (-277.095, 0)
  arc A3 (-285.7758, 3.175) -> (-286.905, 1.5613) centre (-286.4829, 2.4679) ccw
  arc A4 (-277.095, 1.5613) -> (-278.2242, 3.175) centre (-277.5171, 2.4679) ccw
  line L10 (-242, 46.095) -> (-242, 35.905)
  line L11 (-242, 66.095) -> (-242, 55.905)
  line L12 (-245.175, 47.2242) -> (-245.175, 54.7758)
  line L13 (-242, 46.095) -> (-243.5613, 46.095)
  line L14 (-243.5613, 55.905) -> (-242, 55.905)
  arc A5 (-245.175, 47.2242) -> (-243.5613, 46.095) centre (-244.4679, 46.5171) ccw
  arc A6 (-243.5613, 55.905) -> (-245.175, 54.7758) centre (-244.4679, 55.4829) ccw
  line L15 (-242, 86.095) -> (-242, 75.905)
  line L16 (-245.175, 67.2242) -> (-245.175, 74.7758)
  line L17 (-242, 66.095) -> (-243.5613, 66.095)
  line L18 (-243.5613, 75.905) -> (-242, 75.905)
  arc A7 (-245.175, 67.2242) -> (-243.5613, 66.095) centre (-244.4679, 66.5171) ccw
  arc A8 (-243.5613, 75.905) -> (-245.175, 74.7758) centre (-244.4679, 75.4829) ccw
  line L19 (-242, 106.095) -> (-242, 95.905)
  line L20 (-245.175, 87.2242) -> (-245.175, 94.7758)
  line L21 (-242, 86.095) -> (-243.5613, 86.095)
  line L22 (-243.5613, 95.905) -> (-242, 95.905)
  arc A9 (-245.175, 87.2242) -> (-243.5613, 86.095) centre (-244.4679, 86.5171) ccw
  arc A10 (-243.5613, 95.905) -> (-245.175, 94.7758) centre (-244.4679, 95.4829) ccw
  line L23 (-245.175, 0) -> (-246.905, 0)
  line L24 (-302, 182) -> (-242, 182) construction
  line L25 (-242, 182) -> (-242, 0) construction
  line L26 (-242, 0) -> (-302, 0) construction
  line L27 (-302, 0) -> (-302, 182) construction
  line L28 (-272, 182) -> (-272, 10.7369) construction
  arc A11 (-298.825, 14.7758) -> (-300.4387, 15.905) centre (-299.5321, 15.4829) ccw
  arc A12 (-300.4387, 26.095) -> (-298.825, 27.2242) centre (-299.5321, 26.5171) ccw
  line L29 (-302, 46.095) -> (-302, 35.905)
  line L30 (-300.4387, 35.905) -> (-302, 35.905)
  arc A13 (-298.825, 34.7758) -> (-300.4387, 35.905) centre (-299.5321, 35.4829) ccw
  line L31 (-298.825, 27.2242) -> (-298.825, 34.7758)
  line L32 (-298.825, 0) -> (-298.825, 14.7758)
  line L33 (-302, 26.095) -> (-302, 15.905)
  line L34 (-300.4387, 15.905) -> (-302, 15.905)
  line L35 (-302, 26.095) -> (-300.4387, 26.095)
  line L36 (-302, 66.095) -> (-302, 55.905)
  line L37 (-300.4387, 55.905) -> (-302, 55.905)
  line L38 (-298.825, 47.2242) -> (-298.825, 54.7758)
  line L39 (-302, 46.095) -> (-300.4387, 46.095)
  arc A14 (-300.4387, 46.095) -> (-298.825, 47.2242) centre (-299.5321, 46.5171) ccw
  arc A15 (-298.825, 54.7758) -> (-300.4387, 55.905) centre (-299.5321, 55.4829) ccw
  line L40 (-302, 86.095) -> (-302, 75.905)
  line L41 (-300.4387, 75.905) -> (-302, 75.905)
  line L42 (-298.825, 67.2242) -> (-298.825, 74.7758)
  line L43 (-302, 66.095) -> (-300.4387, 66.095)
  arc A16 (-300.4387, 66.095) -> (-298.825, 67.2242) centre (-299.5321, 66.5171) ccw
  arc A17 (-298.825, 74.7758) -> (-300.4387, 75.905) centre (-299.5321, 75.4829) ccw
  line L44 (-302, 106.095) -> (-302, 95.905)
  line L45 (-300.4387, 95.905) -> (-302, 95.905)
  line L46 (-298.825, 87.2242) -> (-298.825, 94.7758)
  line L47 (-302, 86.095) -> (-300.4387, 86.095)
  arc A18 (-300.4387, 86.095) -> (-298.825, 87.2242) centre (-299.5321, 86.5171) ccw
  arc A19 (-298.825, 94.7758) -> (-300.4387, 95.905) centre (-299.5321, 95.4829) ccw
  line L48 (-298.825, 0) -> (-286.905, 0)
  line L49 (-302, 91) -> (-242, 91) construction
  arc A20 (-300.4387, 166.095) -> (-298.825, 167.2242) centre (-299.5321, 166.5171) ccw
  line L50 (-300.4387, 166.095) -> (-302, 166.095)
  line L51 (-298.825, 182) -> (-298.825, 167.2242)
  line L52 (-243.5613, 166.095) -> (-242, 166.095)
  line L53 (-245.175, 182) -> (-245.175, 167.2242)
  arc A21 (-245.175, 167.2242) -> (-243.5613, 166.095) centre (-244.4679, 166.5171) ccw
  line L54 (-245.175, 182) -> (-246.905, 182)
  line L55 (-285.7758, 178.825) -> (-278.2242, 178.825)
  line L56 (-277.095, 180.4387) -> (-277.095, 182)
  arc A22 (-278.2242, 178.825) -> (-277.095, 180.4387) centre (-277.5171, 179.5321) ccw
  line L57 (-286.905, 182) -> (-286.905, 180.4387)
  line L58 (-298.825, 182) -> (-286.905, 182)
  arc A23 (-286.905, 180.4387) -> (-285.7758, 178.825) centre (-286.4829, 179.5321) ccw
  line L59 (-266.905, 182) -> (-277.095, 182)
  line L60 (-242, 126.095) -> (-242, 115.905)
  line L61 (-245.175, 107.2242) -> (-245.175, 114.7758)
  line L62 (-242, 106.095) -> (-243.5613, 106.095)
  line L63 (-243.5613, 115.905) -> (-242, 115.905)
  arc A24 (-245.175, 107.2242) -> (-243.5613, 106.095) centre (-244.4679, 106.5171) ccw
  arc A25 (-243.5613, 115.905) -> (-245.175, 114.7758) centre (-244.4679, 115.4829) ccw
  line L64 (-242, 146.095) -> (-242, 135.905)
  line L65 (-245.175, 127.2242) -> (-245.175, 134.7758)
  line L66 (-242, 126.095) -> (-243.5613, 126.095)
  line L67 (-243.5613, 135.905) -> (-242, 135.905)
  arc A26 (-245.175, 127.2242) -> (-243.5613, 126.095) centre (-244.4679, 126.5171) ccw
  arc A27 (-243.5613, 135.905) -> (-245.175, 134.7758) centre (-244.4679, 135.4829) ccw
  line L68 (-242, 166.095) -> (-242, 155.905)
  line L69 (-245.175, 147.2242) -> (-245.175, 154.7758)
  line L70 (-242, 146.095) -> (-243.5613, 146.095)
  line L71 (-243.5613, 155.905) -> (-242, 155.905)
  arc A28 (-245.175, 147.2242) -> (-243.5613, 146.095) centre (-244.4679, 146.5171) ccw
  arc A29 (-243.5613, 155.905) -> (-245.175, 154.7758) centre (-244.4679, 155.4829) ccw
  arc A30 (-265.7758, 3.175) -> (-266.905, 1.5613) centre (-266.4829, 2.4679) ccw
  line L72 (-265.7758, 3.175) -> (-258.2242, 3.175)
  line L73 (-246.905, 0) -> (-257.095, 0)
  line L74 (-266.905, 0) -> (-266.905, 1.5613)
  line L75 (-257.095, 1.5613) -> (-257.095, 0)
  arc A31 (-257.095, 1.5613) -> (-258.2242, 3.175) centre (-257.5171, 2.4679) ccw
  line L76 (-302, 126.095) -> (-302, 115.905)
  line L77 (-300.4387, 115.905) -> (-302, 115.905)
  line L78 (-298.825, 107.2242) -> (-298.825, 114.7758)
  line L79 (-302, 106.095) -> (-300.4387, 106.095)
  arc A32 (-300.4387, 106.095) -> (-298.825, 107.2242) centre (-299.5321, 106.5171) ccw
  arc A33 (-298.825, 114.7758) -> (-300.4387, 115.905) centre (-299.5321, 115.4829) ccw
  line L80 (-302, 146.095) -> (-302, 135.905)
  line L81 (-300.4387, 135.905) -> (-302, 135.905)
  line L82 (-298.825, 127.2242) -> (-298.825, 134.7758)
  line L83 (-302, 126.095) -> (-300.4387, 126.095)
  arc A34 (-300.4387, 126.095) -> (-298.825, 127.2242) centre (-299.5321, 126.5171) ccw
  arc A35 (-298.825, 134.7758) -> (-300.4387, 135.905) centre (-299.5321, 135.4829) ccw
  line L84 (-302, 166.095) -> (-302, 155.905)
  line L85 (-300.4387, 155.905) -> (-302, 155.905)
  line L86 (-298.825, 147.2242) -> (-298.825, 154.7758)
  line L87 (-302, 146.095) -> (-300.4387, 146.095)
  arc A36 (-300.4387, 146.095) -> (-298.825, 147.2242) centre (-299.5321, 146.5171) ccw
  arc A37 (-298.825, 154.7758) -> (-300.4387, 155.905) centre (-299.5321, 155.4829) ccw
  arc A38 (-266.905, 180.4387) -> (-265.7758, 178.825) centre (-266.4829, 179.5321) ccw
  line L88 (-257.095, 180.4387) -> (-257.095, 182)
  line L89 (-246.905, 182) -> (-257.095, 182)
  line L90 (-265.7758, 178.825) -> (-258.2242, 178.825)
  line L91 (-266.905, 182) -> (-266.905, 180.4387)
  arc A39 (-258.2242, 178.825) -> (-257.095, 180.4387) centre (-257.5171, 179.5321) ccw
  point P0 (-302, 0)
  point P1 (-266.095, 0)
  point P2 (-302, 182)
  point P3 (-266.095, 182)
  point P4 (-302, 182)
  point P5 (-242, 182)
  point P6 (-277.905, 182)
  point P7 (-285.905, 180.4387)
  point P8 (-284.7758, 178.825)
  point P9 (-285.4829, 179.5321)
  point P10 (-285.905, 182)
  point P11 (-302, 182)
  point P12 (-302, 182)
  point P13 (-266.095, 182)
  point P14 (-265.905, 180.4387)
  point P15 (-252, 182)
  point P16 (-264.7758, 178.825)
  point P17 (-265.905, 182)
  point P18 (-265.4829, 179.5321)
  dimension "d1887" = 2
  dimension "d1888" = 0.4221
  dimension "d1889" = 0.7071
  dimension "d1890" = 0.4221
  dimension "d1896" = 2
  dimension "d1899" = 2
  dimension "d1926" = 3.175
  dimension "d1948" = 0.7071
  dimension "d1949" = 0.4221
  dimension "d1951" = 0.4221
  dimension "d1953" = 9.81
  dimension "d1956" = 10.19
  dimension "d1958" = 0.4221
  dimension "d1959" = 0.7071
  dimension "d1960" = 0.7071
  dimension "d1961" = 9.81
  dimension "d1962" = 10.19
  dimension "d1963" = 242
  dimension "d1965" = 3.175
  dimension "d1975" = 15.905
  dimension "d1976" = 10.19
  dimension "d1992" = 20
  dimension "d1993" = 20
  dimension "d2004" = 20
  dimension "d2005" = 0
  dimension "d2012" = 1.73
  dimension "d2140" = 60
  dimension "d2141" = 182
  dimension "d2142" = 242
  dimension "d2145" = 15.095
  dimension "d2148" = 0
  dimension "d2149" = 20
  dimension "d2152" = 20
  dimension "d2153" = 0
extrude "Extrude22" add sketch "MyStock" along normal blind 3.175 separate body makes body 2
equation "fingerWidth = 10 mm"
equation "length = 240 mm"
equation "thickness = 3.175 mm"
equation "height = 60 mm"
equation "toolDiameter = 2 mm"
equation "d34 = toolDiameter"
equation "d36 = boneCenterToHoleSide"
equation "d37 = boneCenterToHoleBottom"
equation "d38 = boneCenterToHoleSide"
equation "boneCenterToHoleBottom = toolDiameter / 2 / sqrt(2) - 0 * kerf" comment "Best: 2.001 -2*kerf, 0.1;;;Best: 2.001 no kerf and 0.1   OLD+6 kerf at 2.001 Diam and .1 mm"
equation "tempLengthPieces = ceil(( ( floor(( length - 2 * thickness ) / fingerWidth) - 2 ) - ( ( floor(( length - 2 * thickness ) / fingerWidth) - 2 ) % 2 - 1 ) ))"
equation "lengthCuts = ceil(tempLengthPieces / 2)"
equation "shoulderToothLength = ( length - fingerWidth * tempLengthPieces ) / 2 - kerf"
equation "depth = 182 mm"
equation "tempDepthPieces = ceil(( ( floor(( depth - 2 * thickness ) / fingerWidth) - 2 ) - ( ( floor(( depth - 2 * thickness ) / fingerWidth) - 2 ) % 2 - 1 ) ))"
equation "depthCuts = ceil(tempDepthPieces / 2)"
equation "shoulderToothDepth = ( depth - fingerWidth * tempDepthPieces ) / 2 - kerf"
equation "d48 = toolDiameter"
equation "d49 = boneCenterToHoleSide"
equation "d50 = shoulderToothDepth"
equation "d52 = boneCenterToHoleSide"
equation "d54 = boneCenterToHoleBottom"
equation "d55 = holeWidth"
equation "tempHeightPieces = ceil(( ( floor(( height - 2 * thickness ) / fingerWidth) - 2 ) - ( ( floor(( height - 2 * thickness ) / fingerWidth) - 2 ) % 2 - 1 ) ))"
equation "heightCuts = ceil(tempHeightPieces / 2)"
equation "sholderToothHeight = ( height - fingerWidth * tempHeightPieces ) / 2 - kerf"
equation "d189 = shoulderToothLength"
equation "kerf = -0.095 mm"
equation "holeWidth = fingerWidth + 2 * kerf"
equation "shoulderHoleLength = shoulderToothLength + 2 * kerf"
equation "shouderHoleDepth = shoulderToothDepth + 2 * kerf"
equation "shoulderHoleHeight = sholderToothHeight + 2 * kerf"
equation "assembleScrewDiam = 2.1 mm"
equation "assembleScrewDistance = 6 mm"
equation "assembleAvoidCollisionDistance = 1 mm"
equation "coolingHoleDistance = 8 mm"
equation "boneCornerToCenterPack = -3 * kerf"
equation "boneCenterToHoleSide = boneCenterToHoleBottom - boneCornerToCenterPack"
equation "d473 = length"
equation "d479 = -toolDiameter / 2"
equation "pumpLength = 52 mm"
equation "pumpCircleDiam = 30 mm"
equation "pumpHeight = 34 mm"
equation "sensorWireDistance = 10 mm"
equation "sensorWireDiam = 3.5 mm"
equation "pumpScrewDiam = 3 mm"
equation "pcbMountHoles = 2 mm"
equation "ventDiameter = 3 mm"
equation "platformGrommetMountDiameter = 3.5 mm"
equation "hangerWireDiameter = 2 mm"
equation "topPillowHoleDistance = 22 mm"
equation "d1829 = height"
equation "d1833 = length"
equation "d1834 = toolDiameter"
equation "d1835 = boneCenterToHoleSide"
equation "d1836 = boneCenterToHoleBottom"
equation "d1837 = boneCenterToHoleSide"
equation "d1842 = toolDiameter"
equation "d1843 = boneCenterToHoleBottom"
equation "d1844 = boneCenterToHoleSide"
equation "d1845 = toolDiameter"
equation "d1846 = boneCenterToHoleSide"
equation "d1848 = toolDiameter"
equation "d1849 = boneCenterToHoleSide"
equation "d1850 = fingerWidth - 2 * kerf"
equation "d1862 = boneCenterToHoleSide"
equation "d1887 = toolDiameter"
equation "d1888 = boneCenterToHoleSide"
equation "d1889 = boneCenterToHoleBottom"
equation "d1890 = boneCenterToHoleSide"
equation "d1896 = toolDiameter"
equation "d1899 = toolDiameter"
equation "d1926 = thickness"
equation "d1948 = boneCenterToHoleBottom"
equation "d1949 = boneCenterToHoleSide"
equation "d1951 = boneCenterToHoleSide"
equation "d1953 = holeWidth"
equation "d1956 = fingerWidth - 2 * kerf"
equation "d1958 = boneCenterToHoleSide"
equation "d1959 = boneCenterToHoleBottom"
equation "d1960 = boneCenterToHoleBottom"
equation "d1961 = holeWidth"
equation "d1962 = fingerWidth - 2 * kerf"
equation "d1963 = length + toolDiameter"
equation "d1965 = thickness"
equation "d1975 = shouderHoleDepth"
equation "d1976 = fingerWidth - 2 * kerf"
equation "d1991 = depthCuts - 1"
equation "d1992 = 2 * fingerWidth"
equation "d1993 = 2 * fingerWidth"
equation "d2002 = heightCuts"
equation "d2004 = 2 * fingerWidth"
equation "d2012 = extraLineHeight"
equation "extraLineHeight = ( max(-appendix + ( sholderToothHeight - thickness ); 0.001 mm) )"
equation "appendix = fingerWidth - 2 * kerf"
equation "d2016 = 3 * thickness"
equation "d2017 = 3 * thickness"
equation "d2062 = appendix"
equation "d2063 = holeWidth"
equation "d2064 = thickness"
equation "d2068 = thickness"
equation "d2069 = appendix"
equation "d2071 = length / 2"
equation "d2072 = lengthCuts"
equation "d2074 = 2 * fingerWidth"
equation "d2076 = extraLineLength"
equation "extraLineLength = ( max(-appendix + ( shoulderToothLength ); 0.001 mm) )"
equation "d2079 = depthCuts"
equation "d2081 = 2 * fingerWidth"
equation "d2082 = lengthCuts"
equation "d2084 = 2 * fingerWidth"
equation "d2087 = extraLineLength"
equation "d2088 = depth"
equation "d2090 = depthCuts"
equation "d2092 = 2 * fingerWidth"
equation "d2095 = extraLineDepth"
equation "extraLineDepth = ( max(-appendix + ( shoulderToothDepth ); 0.001 mm) )"
equation "d2097 = extraLineDepth"
equation "d2098 = depth"
equation "d2102 = depth"
equation "d2103 = depth / 2"
equation "d2104 = thickness"
equation "d2106 = shoulderHoleLength"
equation "d2107 = toolDiameter"
equation "d2109 = holeWidth"
equation "d2110 = fingerWidth - 2 * kerf"
equation "d2111 = height / 2"
equation "d2112 = toolDiameter + length / 2"
equation "d2113 = height - toolDiameter"
equation "d2114 = length + toolDiameter"
equation "d2115 = thickness"
equation "d2116 = thickness"
equation "d2117 = holeWidth"
equation "d2118 = appendix"
equation "d2119 = appendix"
equation "d2122 = shoulderHoleHeight - thickness"
equation "d2124 = lengthCuts - 1"
equation "d2126 = 2 * fingerWidth"
equation "d2128 = lengthCuts - 1"
equation "d2130 = 2 * fingerWidth"
equation "d2133 = heightCuts - 1"
equation "d2135 = 2 * fingerWidth"
equation "d2137 = heightCuts - 1"
equation "d2139 = 2 * fingerWidth"
equation "d2140 = height"
equation "d2141 = depth"
equation "d2142 = toolDiameter + length"
equation "d2145 = sholderToothHeight"
equation "d2147 = depthCuts - 1"
equation "d2149 = 2 * fingerWidth"
equation "d2150 = heightCuts"
equation "d2152 = 2 * fingerWidth"
equation "d2154 = thickness"
